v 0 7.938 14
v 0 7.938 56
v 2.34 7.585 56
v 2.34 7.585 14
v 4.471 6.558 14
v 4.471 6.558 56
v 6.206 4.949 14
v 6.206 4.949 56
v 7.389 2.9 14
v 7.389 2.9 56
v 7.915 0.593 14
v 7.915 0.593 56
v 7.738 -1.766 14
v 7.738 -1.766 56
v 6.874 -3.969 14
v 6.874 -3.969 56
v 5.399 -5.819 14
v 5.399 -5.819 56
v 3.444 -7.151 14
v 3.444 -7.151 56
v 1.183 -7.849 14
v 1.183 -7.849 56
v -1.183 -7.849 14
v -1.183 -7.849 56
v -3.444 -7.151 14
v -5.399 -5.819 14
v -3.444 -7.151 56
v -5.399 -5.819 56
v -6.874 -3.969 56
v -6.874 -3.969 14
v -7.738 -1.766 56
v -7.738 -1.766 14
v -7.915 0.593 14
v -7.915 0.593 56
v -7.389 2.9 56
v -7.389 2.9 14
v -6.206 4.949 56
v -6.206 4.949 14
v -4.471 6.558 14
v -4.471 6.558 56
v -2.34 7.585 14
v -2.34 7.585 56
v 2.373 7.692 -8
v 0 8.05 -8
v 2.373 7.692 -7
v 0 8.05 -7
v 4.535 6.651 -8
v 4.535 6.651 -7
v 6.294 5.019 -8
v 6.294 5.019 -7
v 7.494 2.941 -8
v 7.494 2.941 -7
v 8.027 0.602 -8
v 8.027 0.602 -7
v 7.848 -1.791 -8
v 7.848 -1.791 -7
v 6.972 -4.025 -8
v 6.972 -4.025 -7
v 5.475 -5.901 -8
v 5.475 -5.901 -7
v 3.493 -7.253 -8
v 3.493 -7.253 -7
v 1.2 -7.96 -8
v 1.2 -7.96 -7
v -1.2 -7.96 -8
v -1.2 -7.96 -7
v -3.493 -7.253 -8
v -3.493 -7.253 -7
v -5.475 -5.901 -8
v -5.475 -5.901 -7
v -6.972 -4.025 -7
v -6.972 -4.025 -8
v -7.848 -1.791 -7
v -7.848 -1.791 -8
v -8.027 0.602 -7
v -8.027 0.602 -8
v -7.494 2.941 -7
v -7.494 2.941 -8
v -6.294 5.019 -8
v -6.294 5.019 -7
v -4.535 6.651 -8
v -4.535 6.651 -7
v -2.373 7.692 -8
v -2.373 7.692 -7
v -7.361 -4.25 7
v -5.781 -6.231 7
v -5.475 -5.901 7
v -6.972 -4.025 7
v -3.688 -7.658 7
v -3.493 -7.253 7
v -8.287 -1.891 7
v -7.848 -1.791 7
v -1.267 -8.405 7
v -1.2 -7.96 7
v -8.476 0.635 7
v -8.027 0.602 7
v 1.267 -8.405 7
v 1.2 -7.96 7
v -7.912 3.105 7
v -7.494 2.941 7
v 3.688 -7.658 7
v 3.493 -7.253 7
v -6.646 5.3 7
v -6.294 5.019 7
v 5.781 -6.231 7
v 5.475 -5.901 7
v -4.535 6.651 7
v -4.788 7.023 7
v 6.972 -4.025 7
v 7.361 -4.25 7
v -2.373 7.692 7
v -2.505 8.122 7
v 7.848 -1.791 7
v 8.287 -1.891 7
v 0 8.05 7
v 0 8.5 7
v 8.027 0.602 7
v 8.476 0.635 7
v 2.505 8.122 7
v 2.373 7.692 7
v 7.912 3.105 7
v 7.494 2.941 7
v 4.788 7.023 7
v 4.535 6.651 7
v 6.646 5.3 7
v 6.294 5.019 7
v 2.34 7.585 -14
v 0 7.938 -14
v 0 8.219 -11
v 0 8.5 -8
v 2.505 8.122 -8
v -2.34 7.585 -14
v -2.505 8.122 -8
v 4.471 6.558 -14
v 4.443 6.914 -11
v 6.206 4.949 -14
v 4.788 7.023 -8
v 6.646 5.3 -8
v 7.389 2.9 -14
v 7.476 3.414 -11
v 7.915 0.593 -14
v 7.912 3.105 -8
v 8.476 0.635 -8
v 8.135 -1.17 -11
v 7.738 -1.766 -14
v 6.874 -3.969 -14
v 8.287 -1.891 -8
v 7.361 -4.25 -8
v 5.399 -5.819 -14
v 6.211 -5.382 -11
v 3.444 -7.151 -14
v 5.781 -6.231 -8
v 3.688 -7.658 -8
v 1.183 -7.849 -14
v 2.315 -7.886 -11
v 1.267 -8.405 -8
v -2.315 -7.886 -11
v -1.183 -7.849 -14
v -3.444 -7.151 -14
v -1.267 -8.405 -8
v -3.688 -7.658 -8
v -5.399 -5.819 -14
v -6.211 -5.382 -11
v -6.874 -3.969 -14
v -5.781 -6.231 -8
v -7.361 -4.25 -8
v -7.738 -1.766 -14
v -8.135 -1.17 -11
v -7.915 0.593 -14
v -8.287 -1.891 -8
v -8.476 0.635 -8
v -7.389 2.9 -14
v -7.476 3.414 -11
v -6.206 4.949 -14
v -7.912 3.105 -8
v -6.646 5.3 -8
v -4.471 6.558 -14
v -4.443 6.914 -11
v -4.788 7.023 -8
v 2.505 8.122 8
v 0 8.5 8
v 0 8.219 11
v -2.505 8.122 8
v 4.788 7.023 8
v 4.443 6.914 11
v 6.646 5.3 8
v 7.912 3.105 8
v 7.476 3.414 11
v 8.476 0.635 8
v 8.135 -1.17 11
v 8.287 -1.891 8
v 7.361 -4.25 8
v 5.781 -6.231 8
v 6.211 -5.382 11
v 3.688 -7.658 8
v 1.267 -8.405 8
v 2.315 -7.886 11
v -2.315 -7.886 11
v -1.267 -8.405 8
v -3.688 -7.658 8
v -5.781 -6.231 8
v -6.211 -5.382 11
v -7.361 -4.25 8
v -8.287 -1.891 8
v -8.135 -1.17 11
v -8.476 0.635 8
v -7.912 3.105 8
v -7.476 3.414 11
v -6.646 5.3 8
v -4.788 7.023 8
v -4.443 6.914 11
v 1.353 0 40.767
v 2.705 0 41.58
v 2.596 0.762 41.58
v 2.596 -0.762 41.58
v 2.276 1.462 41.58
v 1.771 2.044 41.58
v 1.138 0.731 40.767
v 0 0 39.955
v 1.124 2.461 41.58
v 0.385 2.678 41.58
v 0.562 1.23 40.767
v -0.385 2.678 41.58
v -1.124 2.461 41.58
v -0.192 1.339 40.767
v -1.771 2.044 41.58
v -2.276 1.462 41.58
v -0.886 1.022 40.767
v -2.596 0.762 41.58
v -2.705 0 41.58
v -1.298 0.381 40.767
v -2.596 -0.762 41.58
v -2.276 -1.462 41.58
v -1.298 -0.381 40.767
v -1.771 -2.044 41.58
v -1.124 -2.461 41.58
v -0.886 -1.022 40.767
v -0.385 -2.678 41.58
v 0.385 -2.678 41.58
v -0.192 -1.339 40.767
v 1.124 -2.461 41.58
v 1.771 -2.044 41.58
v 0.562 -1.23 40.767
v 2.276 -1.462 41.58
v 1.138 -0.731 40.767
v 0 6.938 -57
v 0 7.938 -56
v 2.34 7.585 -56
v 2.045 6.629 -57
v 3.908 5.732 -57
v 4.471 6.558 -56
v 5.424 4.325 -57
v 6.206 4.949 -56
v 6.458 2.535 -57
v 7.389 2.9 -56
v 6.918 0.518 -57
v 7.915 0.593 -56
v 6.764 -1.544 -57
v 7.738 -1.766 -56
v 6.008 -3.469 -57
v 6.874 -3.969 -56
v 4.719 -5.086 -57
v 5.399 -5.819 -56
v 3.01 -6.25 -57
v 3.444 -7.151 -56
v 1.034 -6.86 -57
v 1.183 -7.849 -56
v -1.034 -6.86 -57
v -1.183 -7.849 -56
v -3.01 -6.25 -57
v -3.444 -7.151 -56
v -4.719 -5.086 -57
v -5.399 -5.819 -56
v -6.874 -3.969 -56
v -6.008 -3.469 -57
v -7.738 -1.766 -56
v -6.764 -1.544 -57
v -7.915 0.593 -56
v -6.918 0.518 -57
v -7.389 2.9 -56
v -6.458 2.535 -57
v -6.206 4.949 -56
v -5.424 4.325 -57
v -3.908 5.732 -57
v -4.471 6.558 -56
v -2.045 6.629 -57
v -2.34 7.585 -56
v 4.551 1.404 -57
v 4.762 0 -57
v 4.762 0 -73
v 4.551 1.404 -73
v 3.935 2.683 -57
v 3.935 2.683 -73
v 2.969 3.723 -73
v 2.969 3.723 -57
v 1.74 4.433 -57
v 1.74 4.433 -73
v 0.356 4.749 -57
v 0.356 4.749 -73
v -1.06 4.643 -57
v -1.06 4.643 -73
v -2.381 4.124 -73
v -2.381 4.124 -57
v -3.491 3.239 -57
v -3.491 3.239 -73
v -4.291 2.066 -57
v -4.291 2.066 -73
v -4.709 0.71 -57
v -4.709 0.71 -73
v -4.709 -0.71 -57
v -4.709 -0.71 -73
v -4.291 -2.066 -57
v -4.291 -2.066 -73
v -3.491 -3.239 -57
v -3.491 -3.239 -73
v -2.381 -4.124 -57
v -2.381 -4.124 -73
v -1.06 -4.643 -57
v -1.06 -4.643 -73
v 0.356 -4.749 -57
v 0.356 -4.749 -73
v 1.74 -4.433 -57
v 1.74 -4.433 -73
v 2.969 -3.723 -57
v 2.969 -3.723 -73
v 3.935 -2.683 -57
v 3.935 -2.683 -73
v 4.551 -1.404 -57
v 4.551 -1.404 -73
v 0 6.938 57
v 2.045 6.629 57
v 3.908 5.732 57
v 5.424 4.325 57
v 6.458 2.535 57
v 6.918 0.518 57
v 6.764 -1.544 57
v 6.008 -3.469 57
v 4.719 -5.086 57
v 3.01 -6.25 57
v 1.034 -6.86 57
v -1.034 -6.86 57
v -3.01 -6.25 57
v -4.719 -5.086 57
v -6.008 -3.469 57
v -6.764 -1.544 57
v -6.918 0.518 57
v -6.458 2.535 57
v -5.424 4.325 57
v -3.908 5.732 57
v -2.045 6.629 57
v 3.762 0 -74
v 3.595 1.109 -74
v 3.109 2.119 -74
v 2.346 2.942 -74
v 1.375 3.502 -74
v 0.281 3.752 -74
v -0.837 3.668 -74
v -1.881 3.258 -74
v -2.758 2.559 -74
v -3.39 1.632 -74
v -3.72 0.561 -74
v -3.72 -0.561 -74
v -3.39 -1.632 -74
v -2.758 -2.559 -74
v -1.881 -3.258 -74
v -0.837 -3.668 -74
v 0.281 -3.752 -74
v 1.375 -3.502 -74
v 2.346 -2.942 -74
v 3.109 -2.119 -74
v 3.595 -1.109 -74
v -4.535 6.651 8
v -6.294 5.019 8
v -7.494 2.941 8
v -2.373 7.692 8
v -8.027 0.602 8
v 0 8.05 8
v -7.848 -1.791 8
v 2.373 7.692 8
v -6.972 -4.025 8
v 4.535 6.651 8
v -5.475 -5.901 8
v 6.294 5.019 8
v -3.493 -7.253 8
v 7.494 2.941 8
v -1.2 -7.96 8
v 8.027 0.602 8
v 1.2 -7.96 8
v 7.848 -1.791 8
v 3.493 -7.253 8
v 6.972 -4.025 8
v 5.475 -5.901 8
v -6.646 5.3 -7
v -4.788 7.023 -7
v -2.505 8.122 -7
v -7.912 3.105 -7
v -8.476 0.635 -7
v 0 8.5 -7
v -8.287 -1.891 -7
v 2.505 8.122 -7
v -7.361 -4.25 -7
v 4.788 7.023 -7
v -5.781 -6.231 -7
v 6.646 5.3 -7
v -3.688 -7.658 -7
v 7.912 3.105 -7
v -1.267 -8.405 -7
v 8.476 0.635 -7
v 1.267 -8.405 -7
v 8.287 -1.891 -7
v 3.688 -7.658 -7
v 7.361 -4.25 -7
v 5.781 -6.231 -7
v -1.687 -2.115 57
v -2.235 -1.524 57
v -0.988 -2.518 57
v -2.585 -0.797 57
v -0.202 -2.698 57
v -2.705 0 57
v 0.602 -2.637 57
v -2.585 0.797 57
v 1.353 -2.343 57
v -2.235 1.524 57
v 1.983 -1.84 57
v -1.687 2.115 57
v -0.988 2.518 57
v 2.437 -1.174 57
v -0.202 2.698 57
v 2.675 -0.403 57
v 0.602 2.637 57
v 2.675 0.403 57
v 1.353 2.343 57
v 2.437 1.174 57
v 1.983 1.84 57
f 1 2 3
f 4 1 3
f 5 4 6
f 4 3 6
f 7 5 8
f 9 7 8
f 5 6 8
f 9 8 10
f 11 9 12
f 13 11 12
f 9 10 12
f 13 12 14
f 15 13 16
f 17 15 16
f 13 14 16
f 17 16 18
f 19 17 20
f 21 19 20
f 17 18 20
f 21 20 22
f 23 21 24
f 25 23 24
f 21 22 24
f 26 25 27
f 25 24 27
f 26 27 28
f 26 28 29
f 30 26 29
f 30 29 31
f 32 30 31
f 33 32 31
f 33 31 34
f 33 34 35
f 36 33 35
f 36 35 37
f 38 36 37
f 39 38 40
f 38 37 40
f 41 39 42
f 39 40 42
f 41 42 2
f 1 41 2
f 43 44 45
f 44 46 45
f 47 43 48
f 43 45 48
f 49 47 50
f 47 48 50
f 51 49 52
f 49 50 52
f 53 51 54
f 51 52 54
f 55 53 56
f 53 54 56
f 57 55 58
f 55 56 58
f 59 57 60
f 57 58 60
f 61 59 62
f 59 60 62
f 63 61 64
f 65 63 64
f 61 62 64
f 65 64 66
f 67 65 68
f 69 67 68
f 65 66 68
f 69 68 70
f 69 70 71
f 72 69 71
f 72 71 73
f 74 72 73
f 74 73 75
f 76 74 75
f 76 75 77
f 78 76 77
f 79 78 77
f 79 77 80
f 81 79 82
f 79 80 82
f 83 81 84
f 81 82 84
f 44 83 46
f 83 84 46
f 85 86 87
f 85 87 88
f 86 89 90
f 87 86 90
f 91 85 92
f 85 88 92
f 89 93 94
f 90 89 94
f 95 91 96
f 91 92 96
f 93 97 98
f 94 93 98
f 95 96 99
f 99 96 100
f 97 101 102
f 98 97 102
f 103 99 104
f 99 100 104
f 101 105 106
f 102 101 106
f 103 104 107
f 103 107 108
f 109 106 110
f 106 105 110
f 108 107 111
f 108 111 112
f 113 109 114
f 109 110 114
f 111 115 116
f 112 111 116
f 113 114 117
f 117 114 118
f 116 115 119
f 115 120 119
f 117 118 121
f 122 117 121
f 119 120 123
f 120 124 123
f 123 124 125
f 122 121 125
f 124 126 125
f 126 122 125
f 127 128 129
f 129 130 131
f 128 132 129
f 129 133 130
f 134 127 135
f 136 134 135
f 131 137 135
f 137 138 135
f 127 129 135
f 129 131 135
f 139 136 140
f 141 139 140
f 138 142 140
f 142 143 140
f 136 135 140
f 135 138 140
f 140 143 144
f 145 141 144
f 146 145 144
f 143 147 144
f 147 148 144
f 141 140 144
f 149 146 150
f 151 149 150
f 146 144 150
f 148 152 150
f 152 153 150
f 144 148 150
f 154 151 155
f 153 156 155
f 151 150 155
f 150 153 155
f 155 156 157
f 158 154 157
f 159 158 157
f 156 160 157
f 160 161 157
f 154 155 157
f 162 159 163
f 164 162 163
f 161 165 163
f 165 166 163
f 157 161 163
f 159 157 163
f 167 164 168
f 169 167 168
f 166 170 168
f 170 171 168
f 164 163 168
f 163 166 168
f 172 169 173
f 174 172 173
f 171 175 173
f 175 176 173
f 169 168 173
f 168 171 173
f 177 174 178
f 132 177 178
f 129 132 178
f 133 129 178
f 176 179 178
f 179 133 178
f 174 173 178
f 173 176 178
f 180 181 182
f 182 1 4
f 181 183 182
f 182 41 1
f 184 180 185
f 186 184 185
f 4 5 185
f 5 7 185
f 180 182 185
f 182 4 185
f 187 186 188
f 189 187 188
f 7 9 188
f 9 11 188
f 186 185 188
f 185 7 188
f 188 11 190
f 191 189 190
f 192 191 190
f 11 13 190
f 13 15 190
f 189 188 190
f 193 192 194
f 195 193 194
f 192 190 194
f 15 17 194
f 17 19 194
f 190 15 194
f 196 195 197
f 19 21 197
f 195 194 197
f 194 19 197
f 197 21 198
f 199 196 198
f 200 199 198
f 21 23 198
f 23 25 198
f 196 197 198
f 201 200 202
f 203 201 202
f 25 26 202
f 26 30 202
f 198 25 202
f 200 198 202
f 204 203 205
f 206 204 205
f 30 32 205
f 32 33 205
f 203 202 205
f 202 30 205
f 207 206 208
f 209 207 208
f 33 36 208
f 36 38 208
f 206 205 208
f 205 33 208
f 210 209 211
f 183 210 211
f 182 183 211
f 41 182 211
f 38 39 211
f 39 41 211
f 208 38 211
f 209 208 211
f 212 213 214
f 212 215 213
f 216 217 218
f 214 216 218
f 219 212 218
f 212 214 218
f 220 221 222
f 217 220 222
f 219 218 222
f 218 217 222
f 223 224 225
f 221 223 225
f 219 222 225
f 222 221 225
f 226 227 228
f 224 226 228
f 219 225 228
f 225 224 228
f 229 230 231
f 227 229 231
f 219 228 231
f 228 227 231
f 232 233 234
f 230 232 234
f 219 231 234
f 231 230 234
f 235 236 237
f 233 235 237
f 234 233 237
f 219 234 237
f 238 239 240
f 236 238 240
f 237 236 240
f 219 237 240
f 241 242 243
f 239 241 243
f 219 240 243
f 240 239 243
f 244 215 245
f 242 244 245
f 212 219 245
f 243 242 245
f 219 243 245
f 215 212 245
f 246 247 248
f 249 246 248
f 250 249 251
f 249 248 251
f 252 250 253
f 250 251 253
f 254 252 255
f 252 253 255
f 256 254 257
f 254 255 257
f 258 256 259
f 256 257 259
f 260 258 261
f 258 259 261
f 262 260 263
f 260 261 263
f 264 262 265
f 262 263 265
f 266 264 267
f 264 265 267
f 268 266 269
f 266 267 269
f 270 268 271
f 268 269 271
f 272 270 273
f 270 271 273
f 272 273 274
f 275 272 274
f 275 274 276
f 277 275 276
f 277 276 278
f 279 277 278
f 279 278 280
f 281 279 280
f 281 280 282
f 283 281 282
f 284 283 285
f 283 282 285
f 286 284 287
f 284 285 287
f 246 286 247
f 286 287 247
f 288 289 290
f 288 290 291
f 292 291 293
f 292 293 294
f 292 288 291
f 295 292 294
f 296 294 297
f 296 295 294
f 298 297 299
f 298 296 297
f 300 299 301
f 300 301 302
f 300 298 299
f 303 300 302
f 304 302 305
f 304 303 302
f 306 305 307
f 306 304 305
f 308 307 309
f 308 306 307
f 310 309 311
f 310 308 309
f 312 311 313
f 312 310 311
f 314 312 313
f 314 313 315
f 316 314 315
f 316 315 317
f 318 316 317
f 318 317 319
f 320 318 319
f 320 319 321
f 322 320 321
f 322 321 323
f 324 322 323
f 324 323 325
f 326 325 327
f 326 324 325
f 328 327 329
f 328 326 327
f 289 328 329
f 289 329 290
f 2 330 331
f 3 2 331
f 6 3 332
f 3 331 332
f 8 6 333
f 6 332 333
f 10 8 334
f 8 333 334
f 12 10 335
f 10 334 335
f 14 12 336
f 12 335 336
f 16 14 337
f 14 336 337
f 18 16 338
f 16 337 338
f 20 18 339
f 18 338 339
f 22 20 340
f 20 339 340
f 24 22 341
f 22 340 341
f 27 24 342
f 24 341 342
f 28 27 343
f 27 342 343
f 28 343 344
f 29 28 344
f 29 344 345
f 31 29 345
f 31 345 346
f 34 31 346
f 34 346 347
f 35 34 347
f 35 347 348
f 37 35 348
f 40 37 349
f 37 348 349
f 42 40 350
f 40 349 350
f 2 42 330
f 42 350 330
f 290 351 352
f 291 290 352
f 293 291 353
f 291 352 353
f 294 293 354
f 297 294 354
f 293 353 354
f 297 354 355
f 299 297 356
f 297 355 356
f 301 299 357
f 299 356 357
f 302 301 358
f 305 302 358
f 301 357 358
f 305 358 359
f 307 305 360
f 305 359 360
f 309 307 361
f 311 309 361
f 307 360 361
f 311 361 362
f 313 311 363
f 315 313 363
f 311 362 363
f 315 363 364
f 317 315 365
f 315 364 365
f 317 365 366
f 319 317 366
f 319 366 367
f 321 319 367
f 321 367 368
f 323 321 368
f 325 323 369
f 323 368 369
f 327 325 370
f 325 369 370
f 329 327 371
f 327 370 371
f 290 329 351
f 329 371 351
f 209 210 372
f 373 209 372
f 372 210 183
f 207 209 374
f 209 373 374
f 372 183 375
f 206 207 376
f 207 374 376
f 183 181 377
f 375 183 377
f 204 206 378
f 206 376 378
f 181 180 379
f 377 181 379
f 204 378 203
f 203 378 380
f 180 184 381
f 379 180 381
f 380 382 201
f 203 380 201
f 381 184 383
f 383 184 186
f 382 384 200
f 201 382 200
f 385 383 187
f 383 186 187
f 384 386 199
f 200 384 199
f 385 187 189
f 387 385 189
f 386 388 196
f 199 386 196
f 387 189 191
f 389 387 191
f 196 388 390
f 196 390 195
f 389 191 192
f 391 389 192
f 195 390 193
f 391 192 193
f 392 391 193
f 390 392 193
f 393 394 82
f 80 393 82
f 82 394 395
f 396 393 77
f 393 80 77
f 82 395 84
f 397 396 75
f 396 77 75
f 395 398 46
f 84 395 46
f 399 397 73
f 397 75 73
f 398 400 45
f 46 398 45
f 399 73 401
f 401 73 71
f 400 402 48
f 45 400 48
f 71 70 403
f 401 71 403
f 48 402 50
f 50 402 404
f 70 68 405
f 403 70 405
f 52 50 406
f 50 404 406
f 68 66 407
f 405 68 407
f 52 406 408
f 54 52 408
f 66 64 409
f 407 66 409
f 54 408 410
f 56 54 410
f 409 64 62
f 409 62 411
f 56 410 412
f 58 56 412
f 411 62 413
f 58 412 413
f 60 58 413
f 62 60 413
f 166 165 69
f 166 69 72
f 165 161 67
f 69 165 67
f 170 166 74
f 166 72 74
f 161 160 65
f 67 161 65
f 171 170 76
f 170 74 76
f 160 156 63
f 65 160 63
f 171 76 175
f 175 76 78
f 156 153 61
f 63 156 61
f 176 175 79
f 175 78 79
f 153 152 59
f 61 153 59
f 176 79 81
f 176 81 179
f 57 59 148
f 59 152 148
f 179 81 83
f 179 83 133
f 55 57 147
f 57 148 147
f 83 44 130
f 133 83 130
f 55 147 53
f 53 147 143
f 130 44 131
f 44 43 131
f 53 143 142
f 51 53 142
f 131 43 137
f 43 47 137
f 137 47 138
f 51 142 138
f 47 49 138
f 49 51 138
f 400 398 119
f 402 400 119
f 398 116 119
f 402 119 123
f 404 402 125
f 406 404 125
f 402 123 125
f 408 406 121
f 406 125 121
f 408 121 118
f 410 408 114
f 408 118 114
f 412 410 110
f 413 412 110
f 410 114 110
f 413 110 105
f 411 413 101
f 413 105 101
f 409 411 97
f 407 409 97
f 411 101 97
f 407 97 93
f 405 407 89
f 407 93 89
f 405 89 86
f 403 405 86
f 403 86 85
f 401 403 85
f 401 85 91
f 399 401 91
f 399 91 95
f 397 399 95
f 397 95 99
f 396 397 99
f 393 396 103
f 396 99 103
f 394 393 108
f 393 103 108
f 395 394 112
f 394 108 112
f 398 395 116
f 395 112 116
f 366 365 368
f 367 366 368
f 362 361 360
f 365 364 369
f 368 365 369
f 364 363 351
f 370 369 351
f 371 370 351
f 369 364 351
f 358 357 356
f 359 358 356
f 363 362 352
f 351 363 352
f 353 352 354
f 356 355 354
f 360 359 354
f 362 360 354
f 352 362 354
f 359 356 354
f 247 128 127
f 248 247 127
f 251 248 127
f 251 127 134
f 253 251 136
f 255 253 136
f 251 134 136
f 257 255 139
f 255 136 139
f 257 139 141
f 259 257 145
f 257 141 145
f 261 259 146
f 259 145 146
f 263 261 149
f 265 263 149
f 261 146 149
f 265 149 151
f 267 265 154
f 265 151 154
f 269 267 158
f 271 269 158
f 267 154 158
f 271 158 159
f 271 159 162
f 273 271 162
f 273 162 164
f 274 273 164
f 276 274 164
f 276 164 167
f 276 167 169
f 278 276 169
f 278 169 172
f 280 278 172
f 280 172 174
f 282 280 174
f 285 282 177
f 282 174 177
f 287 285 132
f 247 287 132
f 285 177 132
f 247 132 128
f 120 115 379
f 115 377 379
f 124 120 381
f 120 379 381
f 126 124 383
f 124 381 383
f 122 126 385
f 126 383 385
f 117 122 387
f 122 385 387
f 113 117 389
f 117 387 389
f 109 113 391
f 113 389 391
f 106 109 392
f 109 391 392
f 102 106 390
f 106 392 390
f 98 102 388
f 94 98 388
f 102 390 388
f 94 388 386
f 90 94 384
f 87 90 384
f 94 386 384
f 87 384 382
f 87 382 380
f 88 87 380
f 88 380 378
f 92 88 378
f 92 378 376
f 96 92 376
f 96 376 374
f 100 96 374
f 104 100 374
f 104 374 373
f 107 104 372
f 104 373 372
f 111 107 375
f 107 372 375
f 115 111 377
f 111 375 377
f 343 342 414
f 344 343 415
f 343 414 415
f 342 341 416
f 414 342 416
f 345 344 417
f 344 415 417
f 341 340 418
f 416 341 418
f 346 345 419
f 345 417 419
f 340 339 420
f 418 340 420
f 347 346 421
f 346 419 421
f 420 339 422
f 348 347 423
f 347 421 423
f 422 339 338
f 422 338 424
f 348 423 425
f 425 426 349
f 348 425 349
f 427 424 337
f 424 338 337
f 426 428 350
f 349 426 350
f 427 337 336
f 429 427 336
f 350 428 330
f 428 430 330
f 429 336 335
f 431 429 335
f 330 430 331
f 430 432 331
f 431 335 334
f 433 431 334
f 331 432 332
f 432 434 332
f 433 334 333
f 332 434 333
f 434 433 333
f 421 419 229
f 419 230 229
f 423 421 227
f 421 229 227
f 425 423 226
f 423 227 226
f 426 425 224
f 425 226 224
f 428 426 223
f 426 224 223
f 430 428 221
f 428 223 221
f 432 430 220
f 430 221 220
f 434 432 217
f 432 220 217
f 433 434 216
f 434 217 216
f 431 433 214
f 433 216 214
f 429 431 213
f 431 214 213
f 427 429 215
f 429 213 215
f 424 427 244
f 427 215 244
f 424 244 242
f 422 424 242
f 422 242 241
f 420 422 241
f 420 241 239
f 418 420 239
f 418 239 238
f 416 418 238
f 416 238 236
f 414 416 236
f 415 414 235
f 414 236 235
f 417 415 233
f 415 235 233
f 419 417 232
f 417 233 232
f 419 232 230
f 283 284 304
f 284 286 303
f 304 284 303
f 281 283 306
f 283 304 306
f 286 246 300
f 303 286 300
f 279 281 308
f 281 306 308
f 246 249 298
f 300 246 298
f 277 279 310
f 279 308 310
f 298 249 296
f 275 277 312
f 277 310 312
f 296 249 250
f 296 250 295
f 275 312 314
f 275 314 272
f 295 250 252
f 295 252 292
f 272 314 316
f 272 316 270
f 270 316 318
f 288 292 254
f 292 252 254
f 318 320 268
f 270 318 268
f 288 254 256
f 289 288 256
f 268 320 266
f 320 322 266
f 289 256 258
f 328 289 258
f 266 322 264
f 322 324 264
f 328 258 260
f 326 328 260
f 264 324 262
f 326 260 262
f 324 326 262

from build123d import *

# Parameters (mm, degrees)
CHAMFER1_SIZE               = 1
SKETCH3_R                   = 4.7625
BOSS_EXTRUDE1_DEPTH         = 17
CHAMFER2_SIZE               = 1
F_1_4_28_TAPPED_HOLE1_D     = 5.4102
F_1_4_28_TAPPED_HOLE1_DEPTH = 15.42
F_1_4_28_TAPPED_HOLE1_TIP   = 1.625388061


with BuildPart() as part:
    # Sketch1 → Revolve1 (revolve)
    with BuildSketch(Plane(origin=(0, 0, 0), x_dir=(0, 0, -1), z_dir=(1, 0, 0))):
        Polygon((-8, 8.5), (-14, 7.9375), (-35, 7.9375), (-57, 7.9375), (-57, 0), (57, 0), (57, 7.9375), (35, 7.9375), (14, 7.9375), (8, 8.5), (8, 8.05), (7, 8.05), (7, 8.5), (-7, 8.5), (-7, 8.05), (-8, 8.05), align=None)
    revolve(axis=Axis((0, 0, 83.804844788), (0, 0, -1)))

    # Chamfer1
    chamfer1_edges = [part.edges().sort_by_distance(p)[0] for p in [
        (0, -7.9375, 57),
        (0, -7.9375, -57),
    ]]
    chamfer(chamfer1_edges, length=CHAMFER1_SIZE)

    # Sketch3 → Boss-Extrude1 (add)
    with BuildSketch(Plane.XY.offset(-57)):
        Circle(SKETCH3_R)
    extrude(amount=-BOSS_EXTRUDE1_DEPTH)

    # Chamfer2
    chamfer2_edges = [part.edges().sort_by_distance(p)[0] for p in [
        (-4.7625, 0, -74),
    ]]
    chamfer(chamfer2_edges, length=CHAMFER2_SIZE)

    # 1/4-28 Tapped Hole1
    with Locations(Plane.XY.offset(57)):
        with Locations((0, 0)):
            Hole(F_1_4_28_TAPPED_HOLE1_D / 2, depth=F_1_4_28_TAPPED_HOLE1_DEPTH)
            with Locations((0, 0, -(F_1_4_28_TAPPED_HOLE1_DEPTH + F_1_4_28_TAPPED_HOLE1_TIP / 2))):  # 118° drill point
                Cone(0, F_1_4_28_TAPPED_HOLE1_D / 2, F_1_4_28_TAPPED_HOLE1_TIP, mode=Mode.SUBTRACT)


solid = part.part
